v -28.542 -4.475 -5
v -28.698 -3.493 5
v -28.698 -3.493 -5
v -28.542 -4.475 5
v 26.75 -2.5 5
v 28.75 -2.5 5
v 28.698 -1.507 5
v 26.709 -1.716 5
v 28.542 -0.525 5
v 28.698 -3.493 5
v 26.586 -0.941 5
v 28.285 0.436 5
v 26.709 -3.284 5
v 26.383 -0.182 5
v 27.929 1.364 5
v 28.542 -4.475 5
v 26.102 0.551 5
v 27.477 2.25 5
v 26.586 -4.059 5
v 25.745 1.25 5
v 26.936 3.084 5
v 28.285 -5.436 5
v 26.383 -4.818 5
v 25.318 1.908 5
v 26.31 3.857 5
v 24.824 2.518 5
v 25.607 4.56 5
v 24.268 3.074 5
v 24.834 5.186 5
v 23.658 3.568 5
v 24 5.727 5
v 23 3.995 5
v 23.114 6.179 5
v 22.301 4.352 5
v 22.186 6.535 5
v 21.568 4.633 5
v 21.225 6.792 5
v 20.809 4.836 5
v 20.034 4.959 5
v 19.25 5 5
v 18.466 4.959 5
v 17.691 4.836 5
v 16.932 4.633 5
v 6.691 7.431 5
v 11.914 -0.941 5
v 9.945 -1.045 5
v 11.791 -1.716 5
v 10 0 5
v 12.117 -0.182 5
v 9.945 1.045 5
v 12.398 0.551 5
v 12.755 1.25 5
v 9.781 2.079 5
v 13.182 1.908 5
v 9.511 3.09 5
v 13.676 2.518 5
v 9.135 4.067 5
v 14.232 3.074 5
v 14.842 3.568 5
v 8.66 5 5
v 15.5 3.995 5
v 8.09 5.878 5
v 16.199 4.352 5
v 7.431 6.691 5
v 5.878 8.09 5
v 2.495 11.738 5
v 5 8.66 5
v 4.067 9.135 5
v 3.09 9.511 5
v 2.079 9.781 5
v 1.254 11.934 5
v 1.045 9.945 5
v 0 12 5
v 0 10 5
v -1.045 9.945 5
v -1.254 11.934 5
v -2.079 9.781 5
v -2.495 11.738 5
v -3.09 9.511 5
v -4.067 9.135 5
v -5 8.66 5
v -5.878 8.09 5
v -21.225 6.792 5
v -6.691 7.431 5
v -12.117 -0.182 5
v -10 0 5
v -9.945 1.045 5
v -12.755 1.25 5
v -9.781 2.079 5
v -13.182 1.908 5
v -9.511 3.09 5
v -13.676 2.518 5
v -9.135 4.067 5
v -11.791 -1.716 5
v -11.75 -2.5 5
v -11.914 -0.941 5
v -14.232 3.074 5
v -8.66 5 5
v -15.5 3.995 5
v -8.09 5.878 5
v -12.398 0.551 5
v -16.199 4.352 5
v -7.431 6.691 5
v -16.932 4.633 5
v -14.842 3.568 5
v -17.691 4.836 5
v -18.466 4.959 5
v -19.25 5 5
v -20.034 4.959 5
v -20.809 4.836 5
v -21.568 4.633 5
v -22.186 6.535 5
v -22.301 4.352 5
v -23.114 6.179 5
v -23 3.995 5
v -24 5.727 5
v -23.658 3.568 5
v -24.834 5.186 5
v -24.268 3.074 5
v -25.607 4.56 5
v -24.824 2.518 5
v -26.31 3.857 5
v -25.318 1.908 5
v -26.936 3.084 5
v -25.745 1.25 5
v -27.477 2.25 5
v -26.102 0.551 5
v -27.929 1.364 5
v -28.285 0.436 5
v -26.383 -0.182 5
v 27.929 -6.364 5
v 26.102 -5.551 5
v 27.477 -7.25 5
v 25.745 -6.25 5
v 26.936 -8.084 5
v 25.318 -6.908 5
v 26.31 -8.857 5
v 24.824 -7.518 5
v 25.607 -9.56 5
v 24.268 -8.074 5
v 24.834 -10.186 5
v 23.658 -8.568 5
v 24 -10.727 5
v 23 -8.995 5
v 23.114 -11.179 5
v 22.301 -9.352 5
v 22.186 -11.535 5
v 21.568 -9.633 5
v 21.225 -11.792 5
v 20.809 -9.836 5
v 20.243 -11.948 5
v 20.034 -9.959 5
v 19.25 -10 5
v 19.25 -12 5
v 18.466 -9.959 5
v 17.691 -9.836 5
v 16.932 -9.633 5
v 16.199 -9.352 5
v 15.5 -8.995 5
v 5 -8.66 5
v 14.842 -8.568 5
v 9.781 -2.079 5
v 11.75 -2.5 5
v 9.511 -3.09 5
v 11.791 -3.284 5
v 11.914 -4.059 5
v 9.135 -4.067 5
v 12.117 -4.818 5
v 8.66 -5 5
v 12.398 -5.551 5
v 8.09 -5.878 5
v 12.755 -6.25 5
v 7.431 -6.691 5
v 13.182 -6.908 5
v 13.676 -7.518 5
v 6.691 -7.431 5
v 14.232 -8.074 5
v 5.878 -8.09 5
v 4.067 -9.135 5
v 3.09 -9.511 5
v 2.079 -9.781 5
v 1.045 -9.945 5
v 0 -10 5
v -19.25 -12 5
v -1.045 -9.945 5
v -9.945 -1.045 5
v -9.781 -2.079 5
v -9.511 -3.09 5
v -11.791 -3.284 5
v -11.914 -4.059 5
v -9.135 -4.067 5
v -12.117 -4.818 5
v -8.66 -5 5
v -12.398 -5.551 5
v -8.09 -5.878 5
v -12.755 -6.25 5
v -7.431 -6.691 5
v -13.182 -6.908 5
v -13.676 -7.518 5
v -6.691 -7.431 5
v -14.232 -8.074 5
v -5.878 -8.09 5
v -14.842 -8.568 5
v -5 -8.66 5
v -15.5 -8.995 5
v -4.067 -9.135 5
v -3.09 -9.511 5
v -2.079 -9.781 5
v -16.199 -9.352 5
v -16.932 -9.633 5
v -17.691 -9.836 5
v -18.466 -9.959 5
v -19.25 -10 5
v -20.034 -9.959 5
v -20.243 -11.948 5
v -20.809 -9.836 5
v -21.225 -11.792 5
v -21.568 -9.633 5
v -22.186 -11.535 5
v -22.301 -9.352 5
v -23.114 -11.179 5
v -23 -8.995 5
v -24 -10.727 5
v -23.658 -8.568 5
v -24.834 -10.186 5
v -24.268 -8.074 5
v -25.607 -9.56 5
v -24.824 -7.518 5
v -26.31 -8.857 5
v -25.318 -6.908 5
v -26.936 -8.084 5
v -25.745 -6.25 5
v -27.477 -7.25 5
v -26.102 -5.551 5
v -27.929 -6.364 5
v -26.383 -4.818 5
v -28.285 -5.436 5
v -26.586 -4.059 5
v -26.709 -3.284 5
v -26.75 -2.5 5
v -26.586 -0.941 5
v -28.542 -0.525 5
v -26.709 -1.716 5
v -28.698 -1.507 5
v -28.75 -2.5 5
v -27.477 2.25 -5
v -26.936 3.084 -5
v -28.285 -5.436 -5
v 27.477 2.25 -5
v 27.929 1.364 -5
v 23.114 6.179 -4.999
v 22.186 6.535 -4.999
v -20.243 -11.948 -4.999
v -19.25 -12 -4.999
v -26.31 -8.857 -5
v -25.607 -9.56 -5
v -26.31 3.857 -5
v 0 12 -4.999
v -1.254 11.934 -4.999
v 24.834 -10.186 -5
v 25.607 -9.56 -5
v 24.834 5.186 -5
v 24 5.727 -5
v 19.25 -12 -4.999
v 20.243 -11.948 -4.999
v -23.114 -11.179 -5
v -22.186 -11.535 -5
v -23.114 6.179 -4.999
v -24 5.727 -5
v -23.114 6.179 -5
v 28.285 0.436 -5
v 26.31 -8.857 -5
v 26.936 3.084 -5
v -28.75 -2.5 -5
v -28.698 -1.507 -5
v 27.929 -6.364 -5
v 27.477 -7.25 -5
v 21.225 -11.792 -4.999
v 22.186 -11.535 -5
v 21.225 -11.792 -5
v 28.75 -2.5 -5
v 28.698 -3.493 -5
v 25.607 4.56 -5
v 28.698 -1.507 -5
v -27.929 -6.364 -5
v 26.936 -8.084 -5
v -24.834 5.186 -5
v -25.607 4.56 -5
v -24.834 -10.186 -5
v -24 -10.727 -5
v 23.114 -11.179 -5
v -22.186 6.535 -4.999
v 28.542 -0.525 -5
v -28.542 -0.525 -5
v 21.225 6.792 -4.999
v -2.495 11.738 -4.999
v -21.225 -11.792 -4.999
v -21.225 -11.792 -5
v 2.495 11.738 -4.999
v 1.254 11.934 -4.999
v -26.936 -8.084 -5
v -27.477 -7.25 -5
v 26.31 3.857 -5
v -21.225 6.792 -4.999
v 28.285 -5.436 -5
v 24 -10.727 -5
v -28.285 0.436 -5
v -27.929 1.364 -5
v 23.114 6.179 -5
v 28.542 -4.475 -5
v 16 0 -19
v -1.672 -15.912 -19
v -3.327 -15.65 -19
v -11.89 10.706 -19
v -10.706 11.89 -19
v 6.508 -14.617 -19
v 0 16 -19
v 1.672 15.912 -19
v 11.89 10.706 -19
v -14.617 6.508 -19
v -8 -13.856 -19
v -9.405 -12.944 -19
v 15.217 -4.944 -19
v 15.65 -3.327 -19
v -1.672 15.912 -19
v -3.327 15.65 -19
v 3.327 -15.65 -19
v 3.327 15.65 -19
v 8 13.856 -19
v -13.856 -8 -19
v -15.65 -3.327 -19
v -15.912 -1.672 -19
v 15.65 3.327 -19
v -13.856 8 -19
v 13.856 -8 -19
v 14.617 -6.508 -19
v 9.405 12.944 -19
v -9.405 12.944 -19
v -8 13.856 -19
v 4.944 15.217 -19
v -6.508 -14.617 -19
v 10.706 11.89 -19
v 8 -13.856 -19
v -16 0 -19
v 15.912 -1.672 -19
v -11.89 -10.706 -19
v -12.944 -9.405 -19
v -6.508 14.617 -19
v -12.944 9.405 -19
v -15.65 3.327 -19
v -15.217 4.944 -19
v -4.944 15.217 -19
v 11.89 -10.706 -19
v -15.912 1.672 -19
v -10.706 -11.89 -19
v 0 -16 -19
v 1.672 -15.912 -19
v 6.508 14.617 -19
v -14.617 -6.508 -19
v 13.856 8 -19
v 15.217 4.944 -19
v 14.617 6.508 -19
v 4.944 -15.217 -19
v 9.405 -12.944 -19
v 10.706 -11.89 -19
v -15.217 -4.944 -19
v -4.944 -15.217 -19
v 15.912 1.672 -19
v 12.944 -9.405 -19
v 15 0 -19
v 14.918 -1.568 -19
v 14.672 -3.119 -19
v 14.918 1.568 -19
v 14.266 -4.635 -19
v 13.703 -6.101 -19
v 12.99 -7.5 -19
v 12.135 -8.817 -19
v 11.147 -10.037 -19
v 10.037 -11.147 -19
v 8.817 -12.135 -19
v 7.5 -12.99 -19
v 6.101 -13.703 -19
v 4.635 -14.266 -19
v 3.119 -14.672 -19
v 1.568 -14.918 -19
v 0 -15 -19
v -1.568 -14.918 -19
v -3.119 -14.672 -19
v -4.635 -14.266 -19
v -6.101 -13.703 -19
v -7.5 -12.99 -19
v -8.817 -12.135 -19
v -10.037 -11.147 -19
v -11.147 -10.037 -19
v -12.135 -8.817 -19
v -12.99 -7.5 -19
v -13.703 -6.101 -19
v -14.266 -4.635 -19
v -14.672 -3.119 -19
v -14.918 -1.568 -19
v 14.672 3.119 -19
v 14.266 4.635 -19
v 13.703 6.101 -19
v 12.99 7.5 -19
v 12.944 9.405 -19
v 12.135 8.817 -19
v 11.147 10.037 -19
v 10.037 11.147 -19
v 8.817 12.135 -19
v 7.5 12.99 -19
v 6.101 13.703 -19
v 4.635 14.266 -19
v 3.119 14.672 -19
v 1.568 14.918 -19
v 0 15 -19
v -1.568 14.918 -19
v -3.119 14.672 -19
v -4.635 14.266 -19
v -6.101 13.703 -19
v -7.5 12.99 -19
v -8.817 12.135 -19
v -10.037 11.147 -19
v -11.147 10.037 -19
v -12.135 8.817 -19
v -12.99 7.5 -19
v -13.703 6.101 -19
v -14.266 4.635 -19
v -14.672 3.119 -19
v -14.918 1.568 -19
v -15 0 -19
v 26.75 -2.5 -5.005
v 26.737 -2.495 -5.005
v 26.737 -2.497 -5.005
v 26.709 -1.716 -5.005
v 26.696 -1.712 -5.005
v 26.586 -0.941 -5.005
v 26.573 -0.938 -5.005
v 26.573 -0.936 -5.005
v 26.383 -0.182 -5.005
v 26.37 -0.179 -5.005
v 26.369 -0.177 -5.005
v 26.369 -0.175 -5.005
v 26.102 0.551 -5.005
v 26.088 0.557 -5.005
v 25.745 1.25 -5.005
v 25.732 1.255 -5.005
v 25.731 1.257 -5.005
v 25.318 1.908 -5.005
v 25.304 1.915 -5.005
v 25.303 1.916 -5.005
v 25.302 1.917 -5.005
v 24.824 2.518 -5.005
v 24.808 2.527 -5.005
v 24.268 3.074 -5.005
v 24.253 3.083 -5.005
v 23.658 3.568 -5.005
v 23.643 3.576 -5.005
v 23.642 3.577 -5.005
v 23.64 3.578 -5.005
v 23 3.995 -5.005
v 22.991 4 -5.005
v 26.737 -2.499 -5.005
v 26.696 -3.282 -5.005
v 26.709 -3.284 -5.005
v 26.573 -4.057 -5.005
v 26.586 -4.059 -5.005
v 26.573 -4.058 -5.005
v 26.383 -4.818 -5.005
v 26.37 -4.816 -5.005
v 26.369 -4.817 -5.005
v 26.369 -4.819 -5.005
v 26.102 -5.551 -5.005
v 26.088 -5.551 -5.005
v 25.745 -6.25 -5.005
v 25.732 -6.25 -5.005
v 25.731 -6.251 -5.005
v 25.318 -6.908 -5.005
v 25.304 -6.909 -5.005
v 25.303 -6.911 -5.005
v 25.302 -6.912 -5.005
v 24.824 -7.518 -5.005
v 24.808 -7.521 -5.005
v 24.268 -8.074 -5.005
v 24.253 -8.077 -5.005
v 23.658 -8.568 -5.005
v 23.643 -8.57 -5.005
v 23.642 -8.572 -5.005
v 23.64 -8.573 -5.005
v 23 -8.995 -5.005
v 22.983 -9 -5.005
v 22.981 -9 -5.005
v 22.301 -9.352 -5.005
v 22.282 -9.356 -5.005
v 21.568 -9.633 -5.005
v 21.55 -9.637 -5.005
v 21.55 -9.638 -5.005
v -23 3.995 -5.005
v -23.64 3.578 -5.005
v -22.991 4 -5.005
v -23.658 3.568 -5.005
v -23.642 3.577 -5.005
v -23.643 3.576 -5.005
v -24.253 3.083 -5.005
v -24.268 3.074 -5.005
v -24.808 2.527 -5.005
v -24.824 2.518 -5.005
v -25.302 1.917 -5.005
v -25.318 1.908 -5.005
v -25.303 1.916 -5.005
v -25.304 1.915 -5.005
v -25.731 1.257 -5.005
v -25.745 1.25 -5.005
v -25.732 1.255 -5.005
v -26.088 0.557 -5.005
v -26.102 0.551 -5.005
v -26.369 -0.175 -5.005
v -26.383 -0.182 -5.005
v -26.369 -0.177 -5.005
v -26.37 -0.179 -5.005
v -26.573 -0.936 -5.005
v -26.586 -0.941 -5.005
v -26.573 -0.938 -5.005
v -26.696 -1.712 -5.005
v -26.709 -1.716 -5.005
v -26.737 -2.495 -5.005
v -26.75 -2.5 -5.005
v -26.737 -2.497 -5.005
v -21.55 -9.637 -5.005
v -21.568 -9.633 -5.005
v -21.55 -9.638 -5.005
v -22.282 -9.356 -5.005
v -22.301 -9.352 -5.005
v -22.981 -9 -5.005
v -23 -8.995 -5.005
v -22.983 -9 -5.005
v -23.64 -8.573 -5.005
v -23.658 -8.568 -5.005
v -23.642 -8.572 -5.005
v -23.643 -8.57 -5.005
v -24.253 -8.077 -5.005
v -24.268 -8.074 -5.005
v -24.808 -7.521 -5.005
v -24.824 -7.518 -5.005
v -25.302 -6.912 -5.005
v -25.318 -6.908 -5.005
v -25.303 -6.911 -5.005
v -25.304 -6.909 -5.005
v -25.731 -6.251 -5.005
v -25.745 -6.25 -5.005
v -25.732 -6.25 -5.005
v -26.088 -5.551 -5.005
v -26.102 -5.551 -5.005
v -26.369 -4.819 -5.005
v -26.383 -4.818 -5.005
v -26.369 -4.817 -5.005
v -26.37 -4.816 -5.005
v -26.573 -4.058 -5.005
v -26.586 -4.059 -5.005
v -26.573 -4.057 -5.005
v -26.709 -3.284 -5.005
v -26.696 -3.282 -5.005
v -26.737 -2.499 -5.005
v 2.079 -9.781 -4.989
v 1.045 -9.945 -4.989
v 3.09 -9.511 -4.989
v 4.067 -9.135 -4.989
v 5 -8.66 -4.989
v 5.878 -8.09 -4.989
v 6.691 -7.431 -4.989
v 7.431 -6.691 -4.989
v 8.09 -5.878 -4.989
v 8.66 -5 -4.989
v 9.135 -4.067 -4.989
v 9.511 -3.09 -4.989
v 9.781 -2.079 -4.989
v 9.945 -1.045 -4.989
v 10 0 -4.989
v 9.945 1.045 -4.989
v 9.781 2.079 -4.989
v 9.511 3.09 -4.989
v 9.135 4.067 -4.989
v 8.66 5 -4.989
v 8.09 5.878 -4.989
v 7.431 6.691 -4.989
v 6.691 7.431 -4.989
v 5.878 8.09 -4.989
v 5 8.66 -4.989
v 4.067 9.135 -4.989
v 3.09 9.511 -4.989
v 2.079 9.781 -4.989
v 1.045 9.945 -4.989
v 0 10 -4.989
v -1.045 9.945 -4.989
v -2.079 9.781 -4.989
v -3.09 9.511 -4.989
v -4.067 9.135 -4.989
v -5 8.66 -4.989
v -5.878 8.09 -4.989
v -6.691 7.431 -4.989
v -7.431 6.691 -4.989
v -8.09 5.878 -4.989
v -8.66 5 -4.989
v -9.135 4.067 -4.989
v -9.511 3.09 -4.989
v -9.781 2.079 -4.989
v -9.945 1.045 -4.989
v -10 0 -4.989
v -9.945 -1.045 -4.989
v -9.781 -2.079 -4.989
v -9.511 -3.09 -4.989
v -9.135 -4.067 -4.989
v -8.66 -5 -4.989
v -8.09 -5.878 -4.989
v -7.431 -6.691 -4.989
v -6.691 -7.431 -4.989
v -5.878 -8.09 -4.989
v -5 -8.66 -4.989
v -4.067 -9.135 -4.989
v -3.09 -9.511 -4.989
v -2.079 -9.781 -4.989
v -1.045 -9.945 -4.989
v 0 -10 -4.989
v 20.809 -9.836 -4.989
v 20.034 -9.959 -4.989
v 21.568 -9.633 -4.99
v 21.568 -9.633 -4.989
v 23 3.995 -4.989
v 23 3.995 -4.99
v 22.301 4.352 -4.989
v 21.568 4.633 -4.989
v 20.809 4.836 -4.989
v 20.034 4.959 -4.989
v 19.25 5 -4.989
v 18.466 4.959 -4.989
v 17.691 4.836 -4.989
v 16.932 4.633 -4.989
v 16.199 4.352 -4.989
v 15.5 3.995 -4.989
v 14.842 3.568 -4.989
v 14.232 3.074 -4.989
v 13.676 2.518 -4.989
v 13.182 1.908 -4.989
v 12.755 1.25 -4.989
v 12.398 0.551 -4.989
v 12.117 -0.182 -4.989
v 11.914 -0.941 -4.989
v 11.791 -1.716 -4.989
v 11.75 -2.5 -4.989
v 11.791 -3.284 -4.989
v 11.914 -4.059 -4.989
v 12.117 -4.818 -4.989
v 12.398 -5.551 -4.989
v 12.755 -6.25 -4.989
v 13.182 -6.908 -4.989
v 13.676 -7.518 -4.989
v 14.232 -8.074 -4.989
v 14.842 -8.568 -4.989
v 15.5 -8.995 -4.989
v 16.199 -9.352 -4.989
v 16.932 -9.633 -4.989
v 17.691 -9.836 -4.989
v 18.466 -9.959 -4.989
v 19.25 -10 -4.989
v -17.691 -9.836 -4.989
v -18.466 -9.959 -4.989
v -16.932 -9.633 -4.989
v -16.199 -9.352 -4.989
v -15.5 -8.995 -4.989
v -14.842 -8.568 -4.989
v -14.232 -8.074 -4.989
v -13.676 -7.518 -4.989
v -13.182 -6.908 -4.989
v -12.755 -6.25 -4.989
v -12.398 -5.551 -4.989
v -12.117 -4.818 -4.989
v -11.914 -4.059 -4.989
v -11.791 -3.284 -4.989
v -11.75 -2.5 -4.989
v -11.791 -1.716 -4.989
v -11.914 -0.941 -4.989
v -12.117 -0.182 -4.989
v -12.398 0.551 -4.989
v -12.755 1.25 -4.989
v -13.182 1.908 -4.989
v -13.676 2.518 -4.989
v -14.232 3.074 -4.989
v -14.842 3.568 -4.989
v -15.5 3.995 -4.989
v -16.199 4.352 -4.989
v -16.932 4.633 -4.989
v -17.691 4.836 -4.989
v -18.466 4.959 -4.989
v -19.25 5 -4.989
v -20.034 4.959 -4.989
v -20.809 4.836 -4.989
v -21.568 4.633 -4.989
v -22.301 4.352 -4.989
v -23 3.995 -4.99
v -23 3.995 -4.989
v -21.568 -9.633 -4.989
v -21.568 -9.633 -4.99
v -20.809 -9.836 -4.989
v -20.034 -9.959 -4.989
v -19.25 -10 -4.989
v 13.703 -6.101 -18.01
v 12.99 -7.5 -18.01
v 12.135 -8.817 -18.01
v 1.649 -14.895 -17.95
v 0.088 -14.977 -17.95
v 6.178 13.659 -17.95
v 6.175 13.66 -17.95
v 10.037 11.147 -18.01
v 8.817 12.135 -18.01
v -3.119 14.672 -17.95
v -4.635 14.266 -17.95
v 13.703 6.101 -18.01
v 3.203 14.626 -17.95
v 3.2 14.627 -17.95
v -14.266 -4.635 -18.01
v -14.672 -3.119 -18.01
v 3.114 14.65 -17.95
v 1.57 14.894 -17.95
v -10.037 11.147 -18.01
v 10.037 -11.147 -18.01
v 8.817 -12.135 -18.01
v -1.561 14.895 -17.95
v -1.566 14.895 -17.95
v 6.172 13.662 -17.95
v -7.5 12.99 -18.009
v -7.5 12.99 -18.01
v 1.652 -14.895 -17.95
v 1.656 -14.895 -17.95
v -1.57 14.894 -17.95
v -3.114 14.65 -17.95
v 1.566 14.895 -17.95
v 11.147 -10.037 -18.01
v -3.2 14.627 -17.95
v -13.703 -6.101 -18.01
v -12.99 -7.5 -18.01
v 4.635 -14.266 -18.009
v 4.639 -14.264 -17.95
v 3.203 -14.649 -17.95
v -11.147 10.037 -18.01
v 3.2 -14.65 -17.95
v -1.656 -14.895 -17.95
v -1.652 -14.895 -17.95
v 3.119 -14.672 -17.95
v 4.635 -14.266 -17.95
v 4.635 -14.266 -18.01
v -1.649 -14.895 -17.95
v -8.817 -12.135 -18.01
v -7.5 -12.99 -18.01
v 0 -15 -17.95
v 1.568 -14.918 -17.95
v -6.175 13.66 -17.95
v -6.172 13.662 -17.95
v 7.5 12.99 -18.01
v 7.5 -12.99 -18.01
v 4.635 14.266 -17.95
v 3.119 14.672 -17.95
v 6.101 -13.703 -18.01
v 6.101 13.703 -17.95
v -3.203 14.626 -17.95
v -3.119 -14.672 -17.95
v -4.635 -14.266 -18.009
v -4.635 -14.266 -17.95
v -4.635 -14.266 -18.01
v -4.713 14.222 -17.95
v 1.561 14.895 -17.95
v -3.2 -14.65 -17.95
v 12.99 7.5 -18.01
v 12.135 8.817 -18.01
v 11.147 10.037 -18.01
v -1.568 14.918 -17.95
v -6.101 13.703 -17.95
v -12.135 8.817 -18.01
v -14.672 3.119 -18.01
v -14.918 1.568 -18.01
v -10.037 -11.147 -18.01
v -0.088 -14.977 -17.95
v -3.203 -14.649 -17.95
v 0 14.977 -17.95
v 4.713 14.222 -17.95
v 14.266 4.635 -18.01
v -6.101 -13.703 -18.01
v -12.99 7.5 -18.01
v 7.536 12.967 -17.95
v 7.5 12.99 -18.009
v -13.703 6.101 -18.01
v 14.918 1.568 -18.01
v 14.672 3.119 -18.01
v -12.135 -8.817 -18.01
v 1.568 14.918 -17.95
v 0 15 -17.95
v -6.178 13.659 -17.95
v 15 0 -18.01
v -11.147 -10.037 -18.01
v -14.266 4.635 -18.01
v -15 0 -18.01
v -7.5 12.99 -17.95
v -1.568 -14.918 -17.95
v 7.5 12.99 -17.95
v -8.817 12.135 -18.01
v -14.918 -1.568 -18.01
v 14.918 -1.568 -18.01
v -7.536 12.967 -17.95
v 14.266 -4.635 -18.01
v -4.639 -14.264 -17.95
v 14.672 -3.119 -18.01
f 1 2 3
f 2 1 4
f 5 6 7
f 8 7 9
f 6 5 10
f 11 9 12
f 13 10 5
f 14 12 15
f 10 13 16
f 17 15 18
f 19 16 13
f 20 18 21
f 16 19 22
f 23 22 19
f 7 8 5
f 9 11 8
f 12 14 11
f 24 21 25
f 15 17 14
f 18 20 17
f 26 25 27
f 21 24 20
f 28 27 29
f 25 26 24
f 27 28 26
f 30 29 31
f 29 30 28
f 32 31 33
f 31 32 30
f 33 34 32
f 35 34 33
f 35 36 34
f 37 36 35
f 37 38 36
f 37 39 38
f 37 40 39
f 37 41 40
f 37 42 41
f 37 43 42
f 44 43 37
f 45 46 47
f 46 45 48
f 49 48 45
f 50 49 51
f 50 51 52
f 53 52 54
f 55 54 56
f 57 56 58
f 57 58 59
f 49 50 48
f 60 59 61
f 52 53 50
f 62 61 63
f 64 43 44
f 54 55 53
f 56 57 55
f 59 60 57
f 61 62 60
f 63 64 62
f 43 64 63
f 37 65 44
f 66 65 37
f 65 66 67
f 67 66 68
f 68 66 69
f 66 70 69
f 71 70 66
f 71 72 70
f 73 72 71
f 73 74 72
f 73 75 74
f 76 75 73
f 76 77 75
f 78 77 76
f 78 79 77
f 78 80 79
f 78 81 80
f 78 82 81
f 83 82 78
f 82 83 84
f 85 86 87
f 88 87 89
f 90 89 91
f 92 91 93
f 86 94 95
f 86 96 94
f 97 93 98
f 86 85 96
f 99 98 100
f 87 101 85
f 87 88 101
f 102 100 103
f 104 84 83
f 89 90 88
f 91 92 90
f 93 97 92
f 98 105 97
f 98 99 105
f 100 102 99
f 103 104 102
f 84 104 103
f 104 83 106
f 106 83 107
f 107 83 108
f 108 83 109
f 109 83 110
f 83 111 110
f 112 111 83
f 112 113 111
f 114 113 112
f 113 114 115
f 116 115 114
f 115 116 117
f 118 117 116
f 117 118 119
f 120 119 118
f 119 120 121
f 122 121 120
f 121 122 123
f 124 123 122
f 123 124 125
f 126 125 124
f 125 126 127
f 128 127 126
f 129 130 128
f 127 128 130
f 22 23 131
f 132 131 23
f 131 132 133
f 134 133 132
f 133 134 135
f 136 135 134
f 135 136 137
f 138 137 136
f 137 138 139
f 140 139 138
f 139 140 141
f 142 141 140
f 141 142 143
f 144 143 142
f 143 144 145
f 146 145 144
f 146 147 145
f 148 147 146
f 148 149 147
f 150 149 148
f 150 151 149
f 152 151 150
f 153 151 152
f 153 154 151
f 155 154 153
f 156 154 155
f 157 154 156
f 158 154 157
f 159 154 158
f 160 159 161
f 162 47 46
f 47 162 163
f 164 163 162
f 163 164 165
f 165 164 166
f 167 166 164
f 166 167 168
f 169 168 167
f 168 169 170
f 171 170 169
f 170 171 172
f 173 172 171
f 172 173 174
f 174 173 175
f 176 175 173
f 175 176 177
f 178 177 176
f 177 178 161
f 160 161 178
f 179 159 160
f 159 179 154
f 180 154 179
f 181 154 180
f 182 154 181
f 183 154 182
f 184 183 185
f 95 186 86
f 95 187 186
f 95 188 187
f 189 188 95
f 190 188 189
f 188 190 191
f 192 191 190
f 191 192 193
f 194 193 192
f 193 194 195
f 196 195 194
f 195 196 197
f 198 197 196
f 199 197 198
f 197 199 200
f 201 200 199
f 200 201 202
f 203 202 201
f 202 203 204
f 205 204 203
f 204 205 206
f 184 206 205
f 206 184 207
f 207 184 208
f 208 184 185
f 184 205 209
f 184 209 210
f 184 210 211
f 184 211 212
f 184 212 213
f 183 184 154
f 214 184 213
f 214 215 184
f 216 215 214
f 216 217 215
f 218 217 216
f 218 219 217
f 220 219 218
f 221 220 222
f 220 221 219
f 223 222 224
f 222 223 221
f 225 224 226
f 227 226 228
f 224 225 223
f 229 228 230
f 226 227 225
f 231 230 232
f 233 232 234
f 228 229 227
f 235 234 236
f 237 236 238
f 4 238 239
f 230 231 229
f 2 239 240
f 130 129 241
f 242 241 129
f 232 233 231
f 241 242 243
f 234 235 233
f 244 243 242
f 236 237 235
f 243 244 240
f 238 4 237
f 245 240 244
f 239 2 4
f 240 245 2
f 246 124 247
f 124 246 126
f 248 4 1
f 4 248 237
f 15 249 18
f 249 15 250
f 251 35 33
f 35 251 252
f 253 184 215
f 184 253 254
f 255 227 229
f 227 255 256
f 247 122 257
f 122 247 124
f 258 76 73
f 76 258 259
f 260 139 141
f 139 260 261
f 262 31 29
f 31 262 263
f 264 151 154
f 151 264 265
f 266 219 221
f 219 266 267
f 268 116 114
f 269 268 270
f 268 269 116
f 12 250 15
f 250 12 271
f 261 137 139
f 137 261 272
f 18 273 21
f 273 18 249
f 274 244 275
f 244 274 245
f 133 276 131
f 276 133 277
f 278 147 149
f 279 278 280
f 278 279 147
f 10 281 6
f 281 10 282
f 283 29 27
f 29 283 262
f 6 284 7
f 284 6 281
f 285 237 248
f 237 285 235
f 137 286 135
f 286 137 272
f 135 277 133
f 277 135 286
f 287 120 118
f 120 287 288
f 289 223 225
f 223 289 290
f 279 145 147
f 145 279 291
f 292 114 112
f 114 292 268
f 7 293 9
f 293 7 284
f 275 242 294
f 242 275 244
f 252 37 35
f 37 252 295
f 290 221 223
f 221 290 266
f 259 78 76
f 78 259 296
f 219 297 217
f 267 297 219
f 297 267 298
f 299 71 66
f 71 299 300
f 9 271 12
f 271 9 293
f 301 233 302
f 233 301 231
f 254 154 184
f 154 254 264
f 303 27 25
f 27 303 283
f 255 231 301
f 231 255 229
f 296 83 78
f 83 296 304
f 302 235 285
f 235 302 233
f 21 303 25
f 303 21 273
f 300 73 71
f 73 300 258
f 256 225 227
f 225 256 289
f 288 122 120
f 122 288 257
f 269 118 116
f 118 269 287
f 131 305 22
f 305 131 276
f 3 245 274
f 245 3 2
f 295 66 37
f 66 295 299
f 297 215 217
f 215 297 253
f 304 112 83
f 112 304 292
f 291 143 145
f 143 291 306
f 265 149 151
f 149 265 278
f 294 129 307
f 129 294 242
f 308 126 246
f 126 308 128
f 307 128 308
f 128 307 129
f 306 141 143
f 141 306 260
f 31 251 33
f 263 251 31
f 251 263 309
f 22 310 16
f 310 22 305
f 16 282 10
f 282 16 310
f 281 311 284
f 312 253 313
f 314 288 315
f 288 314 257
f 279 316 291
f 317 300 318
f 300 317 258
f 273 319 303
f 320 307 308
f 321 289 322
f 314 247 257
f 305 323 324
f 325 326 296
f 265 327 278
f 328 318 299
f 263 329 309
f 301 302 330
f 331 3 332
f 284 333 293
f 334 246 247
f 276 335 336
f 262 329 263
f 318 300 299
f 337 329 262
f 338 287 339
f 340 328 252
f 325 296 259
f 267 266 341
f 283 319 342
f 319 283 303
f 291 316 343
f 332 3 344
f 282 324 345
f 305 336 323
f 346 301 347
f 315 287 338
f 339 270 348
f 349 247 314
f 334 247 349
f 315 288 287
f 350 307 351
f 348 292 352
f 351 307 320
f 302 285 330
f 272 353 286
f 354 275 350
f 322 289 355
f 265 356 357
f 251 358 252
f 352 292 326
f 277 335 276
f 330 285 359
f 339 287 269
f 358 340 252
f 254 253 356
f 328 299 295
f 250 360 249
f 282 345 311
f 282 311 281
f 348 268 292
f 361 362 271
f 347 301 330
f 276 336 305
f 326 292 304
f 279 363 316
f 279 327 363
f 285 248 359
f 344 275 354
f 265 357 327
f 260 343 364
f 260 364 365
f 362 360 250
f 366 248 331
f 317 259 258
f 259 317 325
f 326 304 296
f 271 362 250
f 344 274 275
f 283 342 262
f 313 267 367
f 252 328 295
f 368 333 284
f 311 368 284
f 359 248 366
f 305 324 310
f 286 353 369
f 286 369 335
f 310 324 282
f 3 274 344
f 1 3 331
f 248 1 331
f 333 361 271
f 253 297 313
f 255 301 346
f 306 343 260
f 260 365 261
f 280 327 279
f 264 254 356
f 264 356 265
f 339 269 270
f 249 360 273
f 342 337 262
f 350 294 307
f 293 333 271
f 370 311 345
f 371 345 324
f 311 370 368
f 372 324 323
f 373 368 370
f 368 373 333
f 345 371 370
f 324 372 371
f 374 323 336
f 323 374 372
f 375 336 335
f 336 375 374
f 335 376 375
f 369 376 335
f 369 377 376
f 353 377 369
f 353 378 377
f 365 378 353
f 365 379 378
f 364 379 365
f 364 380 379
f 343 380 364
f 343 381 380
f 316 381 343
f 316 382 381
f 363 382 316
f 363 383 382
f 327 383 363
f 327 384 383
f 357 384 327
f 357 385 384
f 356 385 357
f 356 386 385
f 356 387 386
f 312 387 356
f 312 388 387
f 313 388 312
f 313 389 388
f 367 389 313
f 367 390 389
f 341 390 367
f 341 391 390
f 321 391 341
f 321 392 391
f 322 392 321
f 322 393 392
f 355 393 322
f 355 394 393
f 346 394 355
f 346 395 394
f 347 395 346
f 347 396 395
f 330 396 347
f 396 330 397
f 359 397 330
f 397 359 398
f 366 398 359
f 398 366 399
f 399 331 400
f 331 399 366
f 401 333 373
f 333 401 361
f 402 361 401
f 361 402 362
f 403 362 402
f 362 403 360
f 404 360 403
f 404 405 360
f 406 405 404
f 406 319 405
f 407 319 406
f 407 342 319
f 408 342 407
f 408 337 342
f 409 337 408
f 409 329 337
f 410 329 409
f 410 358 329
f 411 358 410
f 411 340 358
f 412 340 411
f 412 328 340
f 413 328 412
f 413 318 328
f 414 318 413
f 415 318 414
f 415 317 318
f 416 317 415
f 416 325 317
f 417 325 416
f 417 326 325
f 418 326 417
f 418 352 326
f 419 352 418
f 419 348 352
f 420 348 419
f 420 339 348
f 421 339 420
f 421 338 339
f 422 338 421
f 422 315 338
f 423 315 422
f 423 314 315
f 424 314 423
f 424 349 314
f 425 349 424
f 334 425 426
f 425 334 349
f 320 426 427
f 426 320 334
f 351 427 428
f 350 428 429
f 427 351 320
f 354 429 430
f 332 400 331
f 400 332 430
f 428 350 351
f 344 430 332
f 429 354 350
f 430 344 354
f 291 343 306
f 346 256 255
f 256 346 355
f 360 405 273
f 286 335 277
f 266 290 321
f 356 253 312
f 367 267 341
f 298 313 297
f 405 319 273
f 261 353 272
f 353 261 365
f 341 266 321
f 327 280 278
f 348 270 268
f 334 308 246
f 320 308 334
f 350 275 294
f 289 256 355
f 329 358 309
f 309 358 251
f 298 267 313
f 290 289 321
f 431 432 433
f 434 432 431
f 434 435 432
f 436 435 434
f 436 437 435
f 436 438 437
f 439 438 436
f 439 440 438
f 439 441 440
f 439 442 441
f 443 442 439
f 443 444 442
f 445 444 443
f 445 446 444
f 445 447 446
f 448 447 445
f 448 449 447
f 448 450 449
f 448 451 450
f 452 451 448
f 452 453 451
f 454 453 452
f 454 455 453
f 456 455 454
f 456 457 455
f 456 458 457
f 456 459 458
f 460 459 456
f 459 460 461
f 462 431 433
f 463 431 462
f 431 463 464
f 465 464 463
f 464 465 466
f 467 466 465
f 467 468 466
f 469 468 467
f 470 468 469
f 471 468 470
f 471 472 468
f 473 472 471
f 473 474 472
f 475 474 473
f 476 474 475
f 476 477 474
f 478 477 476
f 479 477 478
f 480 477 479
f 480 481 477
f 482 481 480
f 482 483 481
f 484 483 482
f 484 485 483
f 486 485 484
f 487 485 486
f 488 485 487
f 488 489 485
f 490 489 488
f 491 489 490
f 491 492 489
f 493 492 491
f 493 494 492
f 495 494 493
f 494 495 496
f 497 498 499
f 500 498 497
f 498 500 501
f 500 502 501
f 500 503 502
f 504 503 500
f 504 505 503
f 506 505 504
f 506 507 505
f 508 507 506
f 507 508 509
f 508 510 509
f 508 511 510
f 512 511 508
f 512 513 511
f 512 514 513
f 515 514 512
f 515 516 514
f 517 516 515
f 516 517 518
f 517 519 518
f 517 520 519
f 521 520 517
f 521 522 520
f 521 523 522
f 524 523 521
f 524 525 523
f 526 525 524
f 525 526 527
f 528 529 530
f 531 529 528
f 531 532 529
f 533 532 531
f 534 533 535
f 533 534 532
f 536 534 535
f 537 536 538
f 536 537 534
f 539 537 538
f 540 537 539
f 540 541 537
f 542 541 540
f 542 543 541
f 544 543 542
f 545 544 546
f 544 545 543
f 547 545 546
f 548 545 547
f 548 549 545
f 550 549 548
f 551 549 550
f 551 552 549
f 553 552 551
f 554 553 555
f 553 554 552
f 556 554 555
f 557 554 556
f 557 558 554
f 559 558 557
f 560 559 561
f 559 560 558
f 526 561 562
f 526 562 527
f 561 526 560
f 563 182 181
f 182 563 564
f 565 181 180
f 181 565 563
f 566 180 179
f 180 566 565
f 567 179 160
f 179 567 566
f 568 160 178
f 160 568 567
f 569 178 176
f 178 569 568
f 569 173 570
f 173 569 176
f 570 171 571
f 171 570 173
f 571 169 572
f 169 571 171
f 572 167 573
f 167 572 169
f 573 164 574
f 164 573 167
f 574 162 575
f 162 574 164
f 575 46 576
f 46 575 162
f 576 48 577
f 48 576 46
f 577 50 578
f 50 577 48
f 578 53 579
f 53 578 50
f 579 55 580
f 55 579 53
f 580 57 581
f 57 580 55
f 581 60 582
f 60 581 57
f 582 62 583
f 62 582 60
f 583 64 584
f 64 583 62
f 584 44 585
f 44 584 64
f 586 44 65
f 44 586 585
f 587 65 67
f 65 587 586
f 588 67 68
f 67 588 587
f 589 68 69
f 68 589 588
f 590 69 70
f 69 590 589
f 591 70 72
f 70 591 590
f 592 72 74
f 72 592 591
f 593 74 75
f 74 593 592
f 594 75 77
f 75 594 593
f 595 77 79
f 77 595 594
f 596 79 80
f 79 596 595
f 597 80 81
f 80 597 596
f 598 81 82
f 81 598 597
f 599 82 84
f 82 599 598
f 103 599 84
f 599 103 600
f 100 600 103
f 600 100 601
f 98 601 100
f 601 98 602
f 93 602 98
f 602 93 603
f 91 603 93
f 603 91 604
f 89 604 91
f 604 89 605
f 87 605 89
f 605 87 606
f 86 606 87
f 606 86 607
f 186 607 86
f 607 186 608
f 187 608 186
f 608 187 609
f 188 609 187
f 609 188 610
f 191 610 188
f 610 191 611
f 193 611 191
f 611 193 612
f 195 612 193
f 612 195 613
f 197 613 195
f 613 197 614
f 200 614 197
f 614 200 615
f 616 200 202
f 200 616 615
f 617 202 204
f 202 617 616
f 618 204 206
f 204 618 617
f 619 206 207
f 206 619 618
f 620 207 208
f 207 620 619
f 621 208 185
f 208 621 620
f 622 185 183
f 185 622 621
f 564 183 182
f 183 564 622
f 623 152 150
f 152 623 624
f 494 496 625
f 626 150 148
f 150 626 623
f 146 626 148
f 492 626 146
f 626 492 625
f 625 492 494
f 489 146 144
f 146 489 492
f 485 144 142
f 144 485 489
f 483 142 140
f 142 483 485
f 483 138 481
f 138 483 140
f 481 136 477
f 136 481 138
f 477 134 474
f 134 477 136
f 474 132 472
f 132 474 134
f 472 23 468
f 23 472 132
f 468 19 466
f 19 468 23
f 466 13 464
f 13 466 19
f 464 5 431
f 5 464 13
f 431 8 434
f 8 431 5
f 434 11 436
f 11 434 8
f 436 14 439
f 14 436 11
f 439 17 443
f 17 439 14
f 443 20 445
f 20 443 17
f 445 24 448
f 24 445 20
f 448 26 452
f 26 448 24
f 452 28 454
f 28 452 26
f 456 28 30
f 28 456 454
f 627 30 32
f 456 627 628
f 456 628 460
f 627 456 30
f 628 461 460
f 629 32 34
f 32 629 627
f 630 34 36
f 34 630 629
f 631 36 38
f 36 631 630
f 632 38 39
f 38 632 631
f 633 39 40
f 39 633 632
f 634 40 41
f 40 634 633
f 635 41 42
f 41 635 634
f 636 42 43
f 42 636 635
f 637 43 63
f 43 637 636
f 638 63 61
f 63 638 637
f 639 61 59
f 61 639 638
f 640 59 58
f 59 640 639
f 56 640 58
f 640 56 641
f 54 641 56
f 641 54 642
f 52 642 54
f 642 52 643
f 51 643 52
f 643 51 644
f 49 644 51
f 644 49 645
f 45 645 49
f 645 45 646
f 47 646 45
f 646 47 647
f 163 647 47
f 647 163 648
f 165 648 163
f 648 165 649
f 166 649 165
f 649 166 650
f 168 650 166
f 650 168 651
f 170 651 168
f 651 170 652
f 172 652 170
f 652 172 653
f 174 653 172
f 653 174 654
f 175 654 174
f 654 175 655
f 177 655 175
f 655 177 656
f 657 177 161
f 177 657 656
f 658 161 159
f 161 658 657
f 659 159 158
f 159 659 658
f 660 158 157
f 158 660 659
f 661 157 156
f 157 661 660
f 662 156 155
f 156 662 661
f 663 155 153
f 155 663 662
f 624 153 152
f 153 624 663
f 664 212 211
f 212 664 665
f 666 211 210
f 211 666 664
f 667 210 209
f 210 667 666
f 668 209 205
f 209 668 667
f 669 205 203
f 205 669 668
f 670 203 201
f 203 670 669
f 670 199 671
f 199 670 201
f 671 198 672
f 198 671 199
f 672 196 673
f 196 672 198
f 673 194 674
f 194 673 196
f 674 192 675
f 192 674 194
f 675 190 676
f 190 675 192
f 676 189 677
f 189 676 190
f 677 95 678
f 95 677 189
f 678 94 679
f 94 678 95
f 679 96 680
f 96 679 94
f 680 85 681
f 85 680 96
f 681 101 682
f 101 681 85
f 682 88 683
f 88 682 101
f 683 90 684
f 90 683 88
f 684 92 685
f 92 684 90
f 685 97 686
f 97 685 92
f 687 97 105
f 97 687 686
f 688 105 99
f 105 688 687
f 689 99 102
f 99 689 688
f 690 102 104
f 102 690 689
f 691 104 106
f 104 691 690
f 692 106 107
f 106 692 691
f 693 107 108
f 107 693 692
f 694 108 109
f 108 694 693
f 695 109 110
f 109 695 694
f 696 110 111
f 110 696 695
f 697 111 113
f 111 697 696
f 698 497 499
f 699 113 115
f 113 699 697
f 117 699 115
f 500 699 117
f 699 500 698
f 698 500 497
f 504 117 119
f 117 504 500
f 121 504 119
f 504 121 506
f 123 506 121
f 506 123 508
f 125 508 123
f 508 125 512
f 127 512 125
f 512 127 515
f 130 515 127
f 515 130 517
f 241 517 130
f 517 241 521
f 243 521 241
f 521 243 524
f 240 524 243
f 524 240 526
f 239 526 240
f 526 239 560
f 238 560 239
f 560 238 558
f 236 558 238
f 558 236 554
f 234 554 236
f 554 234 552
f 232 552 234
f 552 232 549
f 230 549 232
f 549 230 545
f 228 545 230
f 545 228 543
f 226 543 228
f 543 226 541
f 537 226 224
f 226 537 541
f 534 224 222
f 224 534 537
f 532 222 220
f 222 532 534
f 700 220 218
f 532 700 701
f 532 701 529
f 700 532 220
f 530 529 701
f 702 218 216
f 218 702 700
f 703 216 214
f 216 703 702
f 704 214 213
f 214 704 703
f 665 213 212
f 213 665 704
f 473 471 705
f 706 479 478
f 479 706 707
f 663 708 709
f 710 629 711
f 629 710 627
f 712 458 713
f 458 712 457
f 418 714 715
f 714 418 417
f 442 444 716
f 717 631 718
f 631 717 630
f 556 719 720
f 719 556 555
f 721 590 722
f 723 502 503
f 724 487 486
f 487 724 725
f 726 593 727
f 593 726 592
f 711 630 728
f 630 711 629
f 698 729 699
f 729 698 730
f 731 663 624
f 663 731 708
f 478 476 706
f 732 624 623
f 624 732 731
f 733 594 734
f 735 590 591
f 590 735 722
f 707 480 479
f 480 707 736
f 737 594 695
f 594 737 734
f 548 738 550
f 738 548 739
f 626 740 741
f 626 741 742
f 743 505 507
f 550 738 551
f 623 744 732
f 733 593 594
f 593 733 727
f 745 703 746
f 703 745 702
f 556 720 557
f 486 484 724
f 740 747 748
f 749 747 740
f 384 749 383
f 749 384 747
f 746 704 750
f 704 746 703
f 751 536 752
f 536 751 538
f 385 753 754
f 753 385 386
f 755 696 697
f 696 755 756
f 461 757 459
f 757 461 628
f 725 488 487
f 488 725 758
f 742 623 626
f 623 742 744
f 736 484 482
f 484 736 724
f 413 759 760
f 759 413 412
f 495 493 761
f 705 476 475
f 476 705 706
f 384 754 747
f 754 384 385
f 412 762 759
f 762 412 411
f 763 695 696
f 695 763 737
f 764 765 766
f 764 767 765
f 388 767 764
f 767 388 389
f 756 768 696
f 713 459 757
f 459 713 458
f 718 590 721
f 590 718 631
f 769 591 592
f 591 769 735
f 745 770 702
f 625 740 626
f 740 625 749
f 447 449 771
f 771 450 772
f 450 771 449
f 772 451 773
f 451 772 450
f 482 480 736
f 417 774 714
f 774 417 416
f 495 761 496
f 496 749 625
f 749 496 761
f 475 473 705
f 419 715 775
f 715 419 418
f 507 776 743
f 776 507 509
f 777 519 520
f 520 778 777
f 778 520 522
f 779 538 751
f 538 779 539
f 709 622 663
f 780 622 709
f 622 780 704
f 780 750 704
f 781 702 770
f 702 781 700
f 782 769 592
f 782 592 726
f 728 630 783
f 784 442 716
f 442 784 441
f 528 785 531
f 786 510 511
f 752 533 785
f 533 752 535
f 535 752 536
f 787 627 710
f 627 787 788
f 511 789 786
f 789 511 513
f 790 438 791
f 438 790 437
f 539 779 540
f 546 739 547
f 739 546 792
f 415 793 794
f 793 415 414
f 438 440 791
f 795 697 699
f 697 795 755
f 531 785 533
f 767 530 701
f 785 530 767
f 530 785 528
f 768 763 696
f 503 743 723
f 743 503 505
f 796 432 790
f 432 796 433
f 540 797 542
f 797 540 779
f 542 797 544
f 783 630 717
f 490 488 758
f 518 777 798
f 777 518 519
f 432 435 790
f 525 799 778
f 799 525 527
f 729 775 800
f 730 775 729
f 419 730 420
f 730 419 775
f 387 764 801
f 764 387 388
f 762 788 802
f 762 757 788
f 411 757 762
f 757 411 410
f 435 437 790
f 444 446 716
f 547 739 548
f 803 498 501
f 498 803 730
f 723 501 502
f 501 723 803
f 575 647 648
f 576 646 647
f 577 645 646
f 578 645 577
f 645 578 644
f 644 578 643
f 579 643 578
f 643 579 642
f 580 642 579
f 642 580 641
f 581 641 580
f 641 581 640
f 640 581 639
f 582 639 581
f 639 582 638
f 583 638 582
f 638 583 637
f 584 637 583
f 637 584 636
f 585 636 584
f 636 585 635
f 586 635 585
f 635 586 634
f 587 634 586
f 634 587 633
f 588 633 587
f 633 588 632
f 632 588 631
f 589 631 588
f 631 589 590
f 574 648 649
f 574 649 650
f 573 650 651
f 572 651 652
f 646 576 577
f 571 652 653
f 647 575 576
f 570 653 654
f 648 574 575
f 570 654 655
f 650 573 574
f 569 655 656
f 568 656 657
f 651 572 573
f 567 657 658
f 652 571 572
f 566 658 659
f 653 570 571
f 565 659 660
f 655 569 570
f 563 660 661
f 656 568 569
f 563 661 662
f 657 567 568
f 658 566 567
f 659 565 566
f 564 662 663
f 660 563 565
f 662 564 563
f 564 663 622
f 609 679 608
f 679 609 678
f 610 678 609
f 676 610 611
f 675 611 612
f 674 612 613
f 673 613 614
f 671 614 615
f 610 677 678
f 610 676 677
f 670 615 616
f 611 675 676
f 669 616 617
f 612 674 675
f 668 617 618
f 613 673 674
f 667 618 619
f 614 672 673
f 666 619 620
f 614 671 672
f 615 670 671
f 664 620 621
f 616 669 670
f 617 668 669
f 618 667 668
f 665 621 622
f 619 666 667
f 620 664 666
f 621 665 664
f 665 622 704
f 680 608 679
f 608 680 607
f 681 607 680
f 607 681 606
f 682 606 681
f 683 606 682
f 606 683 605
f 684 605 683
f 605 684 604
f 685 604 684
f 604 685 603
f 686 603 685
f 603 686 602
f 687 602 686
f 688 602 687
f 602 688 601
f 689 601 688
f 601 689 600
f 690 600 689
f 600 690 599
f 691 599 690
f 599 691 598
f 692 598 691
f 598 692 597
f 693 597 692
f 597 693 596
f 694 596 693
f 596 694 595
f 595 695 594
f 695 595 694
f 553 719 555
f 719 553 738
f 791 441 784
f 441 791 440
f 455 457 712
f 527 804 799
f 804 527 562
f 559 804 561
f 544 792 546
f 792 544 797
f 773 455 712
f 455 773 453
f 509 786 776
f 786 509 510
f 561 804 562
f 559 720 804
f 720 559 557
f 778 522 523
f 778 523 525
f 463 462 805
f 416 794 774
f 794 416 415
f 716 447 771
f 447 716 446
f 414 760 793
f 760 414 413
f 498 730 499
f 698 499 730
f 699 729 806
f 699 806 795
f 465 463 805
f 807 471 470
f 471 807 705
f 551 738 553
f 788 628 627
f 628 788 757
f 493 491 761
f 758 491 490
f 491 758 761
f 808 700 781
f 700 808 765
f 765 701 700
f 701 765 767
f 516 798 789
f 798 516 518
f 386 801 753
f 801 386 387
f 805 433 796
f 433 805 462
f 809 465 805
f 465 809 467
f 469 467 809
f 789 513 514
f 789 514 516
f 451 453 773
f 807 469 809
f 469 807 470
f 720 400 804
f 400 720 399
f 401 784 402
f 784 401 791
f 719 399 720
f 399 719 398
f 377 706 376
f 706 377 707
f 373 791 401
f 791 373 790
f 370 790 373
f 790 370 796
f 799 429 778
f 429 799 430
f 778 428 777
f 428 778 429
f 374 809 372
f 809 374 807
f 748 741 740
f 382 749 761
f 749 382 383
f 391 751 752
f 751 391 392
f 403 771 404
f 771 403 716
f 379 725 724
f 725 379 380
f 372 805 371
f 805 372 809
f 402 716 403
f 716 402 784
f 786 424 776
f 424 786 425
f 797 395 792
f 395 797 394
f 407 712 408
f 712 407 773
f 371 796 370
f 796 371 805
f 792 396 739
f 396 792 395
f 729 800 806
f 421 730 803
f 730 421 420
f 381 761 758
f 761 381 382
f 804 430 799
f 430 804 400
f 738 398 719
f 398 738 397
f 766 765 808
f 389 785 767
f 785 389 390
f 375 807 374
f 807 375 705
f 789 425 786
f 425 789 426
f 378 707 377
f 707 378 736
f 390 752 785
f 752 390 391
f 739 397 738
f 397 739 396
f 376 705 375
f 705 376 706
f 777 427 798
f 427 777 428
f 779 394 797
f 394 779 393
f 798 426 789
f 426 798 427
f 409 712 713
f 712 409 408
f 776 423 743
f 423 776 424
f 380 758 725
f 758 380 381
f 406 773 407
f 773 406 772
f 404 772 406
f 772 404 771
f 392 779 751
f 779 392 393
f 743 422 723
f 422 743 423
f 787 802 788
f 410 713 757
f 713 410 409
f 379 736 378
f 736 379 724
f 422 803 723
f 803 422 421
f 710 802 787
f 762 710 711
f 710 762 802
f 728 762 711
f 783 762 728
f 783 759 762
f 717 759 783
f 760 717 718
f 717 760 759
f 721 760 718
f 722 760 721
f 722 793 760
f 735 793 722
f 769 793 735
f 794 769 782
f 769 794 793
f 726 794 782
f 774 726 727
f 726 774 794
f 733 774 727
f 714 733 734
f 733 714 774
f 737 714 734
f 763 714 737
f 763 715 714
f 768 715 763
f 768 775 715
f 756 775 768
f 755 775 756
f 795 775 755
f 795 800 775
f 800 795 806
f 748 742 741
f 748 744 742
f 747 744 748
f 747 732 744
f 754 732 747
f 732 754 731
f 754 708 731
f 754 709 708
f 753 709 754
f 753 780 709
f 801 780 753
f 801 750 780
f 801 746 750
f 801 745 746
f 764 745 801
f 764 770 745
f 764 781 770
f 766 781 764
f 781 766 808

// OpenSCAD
dremel_accessory_diam = 20;
dremel_accesory_height = 12-2;

aspirator_thickness_thick = 2;
aspirator_thickness_slim = 1;
aspirator_thickness_screw = aspirator_thickness_slim;

aspirator_tube_diam = 15;
aspirator_tube_holder_height = 15;

aspirator_hole_height = 15+5-6;
aspirator_hole_diam = 30;

dremel_wrench_diam = 0;
dremel_wrench_hole_offset = 8;

dremel_accessory_screw_separation = dremel_accessory_diam+aspirator_thickness_screw+1.25;
dremel_accessory_angle = 8;

dremel_accessory_tube_offset = dremel_accessory_diam-aspirator_tube_diam;
aspirator_tube_separation = dremel_accessory_diam+aspirator_tube_diam+aspirator_thickness_screw*2+1.5;
dremel_accessory_hole_offset = 0;//dremel_accessory_diam-aspirator_hole_diam;

// Useful MCAD functions reference

//use <MCAD/motors.scad>
//stepper_motor_mount(nema_standard=17, slide_distance=10, $fn=40, mochup=true);

//use <MCAD/boxes.scad>
//roundedBox([10,20,30], radius=2, sidesonly=false, $fn=60);

//include <MCAD/stepper.scad>
//motor(Nema17, size=NemaMedium, dualAxis=false);


//use <MCAD/teardrop.scad>
//teardrop(radius=10, length=20, angle=90);

//use <MCAD/nuts_and_bolts.scad>
//nutHole(size=3, tolerance=0.5, proj=-1);
//boltHole(size=3, length=10, tolerance=0.5, proj=-1, $fn=40);

use <MCAD/teardrop.scad>
use <MCAD/nuts_and_bolts.scad>

module aspirator_accessory_2Dshape() {
	hull() {
		translate([aspirator_tube_separation/2,-dremel_accessory_tube_offset/2])
			circle(r=aspirator_thickness_thick+aspirator_tube_diam/2, h=dremel_accesory_height, $fn=60);
		circle(r=aspirator_thickness_thick+dremel_accessory_diam/2, h=dremel_accesory_height, $fn=60);
		translate([-aspirator_tube_separation/2,-dremel_accessory_tube_offset/2])
			circle(r=aspirator_thickness_thick+aspirator_tube_diam/2, h=dremel_accesory_height, $fn=60);
	}
}

module aspirator_accessory_filledshape() {
	linear_extrude(height=dremel_accesory_height,center=true)
		aspirator_accessory_2Dshape();
	hull() {
		translate([0,0,-dremel_accesory_height/2])
			linear_extrude(height=0.001,center=true)
				aspirator_accessory_2Dshape();
		translate([0,dremel_accessory_hole_offset/2,-dremel_accesory_height/2-aspirator_hole_height])
			linear_extrude(height=0.001,center=true)
				circle(r=aspirator_thickness_slim+aspirator_hole_diam/2, $fn=60);
	}
}

module aspirator_accessory_2Dholes() {
	translate([aspirator_tube_separation/2,-dremel_accessory_tube_offset/2])
		circle(r=aspirator_tube_diam/2, $fn=60);
	circle(r=dremel_accessory_diam/2, $fn=60);
	translate([-aspirator_tube_separation/2,-dremel_accessory_tube_offset/2])
		circle(r=aspirator_tube_diam/2, $fn=60);
}

module screwHole() {
	translate([0,-7,0])
		rotate([90,0,0])
		hull() {
		translate([0,0,20])
			nutHole(size=3, tolerance=0.5, proj=-1);
		nutHole(size=3, tolerance=0.5, proj=-1);
		}
	translate([0,7,0])
		rotate([90,0,0])
			boltHole(size=3, length=30, tolerance=0.4, proj=-1, $fn=40);
}

module aspirator_accessory_holes() {
	linear_extrude(height=dremel_accesory_height+0.01,center=true)
		aspirator_accessory_2Dholes();
	hull() {
		translate([0,0,-dremel_accesory_height/2+0.01])
			linear_extrude(height=0.001,center=true)
				aspirator_accessory_2Dholes();
		translate([0,dremel_accessory_hole_offset/2,-dremel_accesory_height/2-aspirator_hole_height+1-0.01])
			linear_extrude(height=0.001,center=true)
				circle(r=aspirator_hole_diam/2, $fn=60);
	}
	translate([0,dremel_accessory_hole_offset/2,-dremel_accesory_height/2-aspirator_hole_height])
			linear_extrude(height=2+0.1,center=true)
				circle(r=aspirator_hole_diam/2, $fn=60);
	// Hole for the tightener
	*translate([0,-dremel_accessory_tube_offset/4,0])
		cube([aspirator_tube_separation,1,dremel_accesory_height+0.01],center=true);
	// Frontal hole for the wrench
	*translate([0,(dremel_accessory_diam+aspirator_thickness_thick)/2,-(dremel_accesory_height+aspirator_hole_height)/2-dremel_wrench_hole_offset])
		cube([dremel_wrench_diam,10,aspirator_hole_height+0.01],center=true);
	// Holes for the nut/screws
	*translate([dremel_accessory_screw_separation/2,0,0])
		rotate([0,0,-dremel_accessory_angle])
			screwHole();
	*translate([-dremel_accessory_screw_separation/2,0,0])
		rotate([0,0,dremel_accessory_angle])
			screwHole();
}

difference() {
	aspirator_accessory_filledshape();
	aspirator_accessory_holes();
}
